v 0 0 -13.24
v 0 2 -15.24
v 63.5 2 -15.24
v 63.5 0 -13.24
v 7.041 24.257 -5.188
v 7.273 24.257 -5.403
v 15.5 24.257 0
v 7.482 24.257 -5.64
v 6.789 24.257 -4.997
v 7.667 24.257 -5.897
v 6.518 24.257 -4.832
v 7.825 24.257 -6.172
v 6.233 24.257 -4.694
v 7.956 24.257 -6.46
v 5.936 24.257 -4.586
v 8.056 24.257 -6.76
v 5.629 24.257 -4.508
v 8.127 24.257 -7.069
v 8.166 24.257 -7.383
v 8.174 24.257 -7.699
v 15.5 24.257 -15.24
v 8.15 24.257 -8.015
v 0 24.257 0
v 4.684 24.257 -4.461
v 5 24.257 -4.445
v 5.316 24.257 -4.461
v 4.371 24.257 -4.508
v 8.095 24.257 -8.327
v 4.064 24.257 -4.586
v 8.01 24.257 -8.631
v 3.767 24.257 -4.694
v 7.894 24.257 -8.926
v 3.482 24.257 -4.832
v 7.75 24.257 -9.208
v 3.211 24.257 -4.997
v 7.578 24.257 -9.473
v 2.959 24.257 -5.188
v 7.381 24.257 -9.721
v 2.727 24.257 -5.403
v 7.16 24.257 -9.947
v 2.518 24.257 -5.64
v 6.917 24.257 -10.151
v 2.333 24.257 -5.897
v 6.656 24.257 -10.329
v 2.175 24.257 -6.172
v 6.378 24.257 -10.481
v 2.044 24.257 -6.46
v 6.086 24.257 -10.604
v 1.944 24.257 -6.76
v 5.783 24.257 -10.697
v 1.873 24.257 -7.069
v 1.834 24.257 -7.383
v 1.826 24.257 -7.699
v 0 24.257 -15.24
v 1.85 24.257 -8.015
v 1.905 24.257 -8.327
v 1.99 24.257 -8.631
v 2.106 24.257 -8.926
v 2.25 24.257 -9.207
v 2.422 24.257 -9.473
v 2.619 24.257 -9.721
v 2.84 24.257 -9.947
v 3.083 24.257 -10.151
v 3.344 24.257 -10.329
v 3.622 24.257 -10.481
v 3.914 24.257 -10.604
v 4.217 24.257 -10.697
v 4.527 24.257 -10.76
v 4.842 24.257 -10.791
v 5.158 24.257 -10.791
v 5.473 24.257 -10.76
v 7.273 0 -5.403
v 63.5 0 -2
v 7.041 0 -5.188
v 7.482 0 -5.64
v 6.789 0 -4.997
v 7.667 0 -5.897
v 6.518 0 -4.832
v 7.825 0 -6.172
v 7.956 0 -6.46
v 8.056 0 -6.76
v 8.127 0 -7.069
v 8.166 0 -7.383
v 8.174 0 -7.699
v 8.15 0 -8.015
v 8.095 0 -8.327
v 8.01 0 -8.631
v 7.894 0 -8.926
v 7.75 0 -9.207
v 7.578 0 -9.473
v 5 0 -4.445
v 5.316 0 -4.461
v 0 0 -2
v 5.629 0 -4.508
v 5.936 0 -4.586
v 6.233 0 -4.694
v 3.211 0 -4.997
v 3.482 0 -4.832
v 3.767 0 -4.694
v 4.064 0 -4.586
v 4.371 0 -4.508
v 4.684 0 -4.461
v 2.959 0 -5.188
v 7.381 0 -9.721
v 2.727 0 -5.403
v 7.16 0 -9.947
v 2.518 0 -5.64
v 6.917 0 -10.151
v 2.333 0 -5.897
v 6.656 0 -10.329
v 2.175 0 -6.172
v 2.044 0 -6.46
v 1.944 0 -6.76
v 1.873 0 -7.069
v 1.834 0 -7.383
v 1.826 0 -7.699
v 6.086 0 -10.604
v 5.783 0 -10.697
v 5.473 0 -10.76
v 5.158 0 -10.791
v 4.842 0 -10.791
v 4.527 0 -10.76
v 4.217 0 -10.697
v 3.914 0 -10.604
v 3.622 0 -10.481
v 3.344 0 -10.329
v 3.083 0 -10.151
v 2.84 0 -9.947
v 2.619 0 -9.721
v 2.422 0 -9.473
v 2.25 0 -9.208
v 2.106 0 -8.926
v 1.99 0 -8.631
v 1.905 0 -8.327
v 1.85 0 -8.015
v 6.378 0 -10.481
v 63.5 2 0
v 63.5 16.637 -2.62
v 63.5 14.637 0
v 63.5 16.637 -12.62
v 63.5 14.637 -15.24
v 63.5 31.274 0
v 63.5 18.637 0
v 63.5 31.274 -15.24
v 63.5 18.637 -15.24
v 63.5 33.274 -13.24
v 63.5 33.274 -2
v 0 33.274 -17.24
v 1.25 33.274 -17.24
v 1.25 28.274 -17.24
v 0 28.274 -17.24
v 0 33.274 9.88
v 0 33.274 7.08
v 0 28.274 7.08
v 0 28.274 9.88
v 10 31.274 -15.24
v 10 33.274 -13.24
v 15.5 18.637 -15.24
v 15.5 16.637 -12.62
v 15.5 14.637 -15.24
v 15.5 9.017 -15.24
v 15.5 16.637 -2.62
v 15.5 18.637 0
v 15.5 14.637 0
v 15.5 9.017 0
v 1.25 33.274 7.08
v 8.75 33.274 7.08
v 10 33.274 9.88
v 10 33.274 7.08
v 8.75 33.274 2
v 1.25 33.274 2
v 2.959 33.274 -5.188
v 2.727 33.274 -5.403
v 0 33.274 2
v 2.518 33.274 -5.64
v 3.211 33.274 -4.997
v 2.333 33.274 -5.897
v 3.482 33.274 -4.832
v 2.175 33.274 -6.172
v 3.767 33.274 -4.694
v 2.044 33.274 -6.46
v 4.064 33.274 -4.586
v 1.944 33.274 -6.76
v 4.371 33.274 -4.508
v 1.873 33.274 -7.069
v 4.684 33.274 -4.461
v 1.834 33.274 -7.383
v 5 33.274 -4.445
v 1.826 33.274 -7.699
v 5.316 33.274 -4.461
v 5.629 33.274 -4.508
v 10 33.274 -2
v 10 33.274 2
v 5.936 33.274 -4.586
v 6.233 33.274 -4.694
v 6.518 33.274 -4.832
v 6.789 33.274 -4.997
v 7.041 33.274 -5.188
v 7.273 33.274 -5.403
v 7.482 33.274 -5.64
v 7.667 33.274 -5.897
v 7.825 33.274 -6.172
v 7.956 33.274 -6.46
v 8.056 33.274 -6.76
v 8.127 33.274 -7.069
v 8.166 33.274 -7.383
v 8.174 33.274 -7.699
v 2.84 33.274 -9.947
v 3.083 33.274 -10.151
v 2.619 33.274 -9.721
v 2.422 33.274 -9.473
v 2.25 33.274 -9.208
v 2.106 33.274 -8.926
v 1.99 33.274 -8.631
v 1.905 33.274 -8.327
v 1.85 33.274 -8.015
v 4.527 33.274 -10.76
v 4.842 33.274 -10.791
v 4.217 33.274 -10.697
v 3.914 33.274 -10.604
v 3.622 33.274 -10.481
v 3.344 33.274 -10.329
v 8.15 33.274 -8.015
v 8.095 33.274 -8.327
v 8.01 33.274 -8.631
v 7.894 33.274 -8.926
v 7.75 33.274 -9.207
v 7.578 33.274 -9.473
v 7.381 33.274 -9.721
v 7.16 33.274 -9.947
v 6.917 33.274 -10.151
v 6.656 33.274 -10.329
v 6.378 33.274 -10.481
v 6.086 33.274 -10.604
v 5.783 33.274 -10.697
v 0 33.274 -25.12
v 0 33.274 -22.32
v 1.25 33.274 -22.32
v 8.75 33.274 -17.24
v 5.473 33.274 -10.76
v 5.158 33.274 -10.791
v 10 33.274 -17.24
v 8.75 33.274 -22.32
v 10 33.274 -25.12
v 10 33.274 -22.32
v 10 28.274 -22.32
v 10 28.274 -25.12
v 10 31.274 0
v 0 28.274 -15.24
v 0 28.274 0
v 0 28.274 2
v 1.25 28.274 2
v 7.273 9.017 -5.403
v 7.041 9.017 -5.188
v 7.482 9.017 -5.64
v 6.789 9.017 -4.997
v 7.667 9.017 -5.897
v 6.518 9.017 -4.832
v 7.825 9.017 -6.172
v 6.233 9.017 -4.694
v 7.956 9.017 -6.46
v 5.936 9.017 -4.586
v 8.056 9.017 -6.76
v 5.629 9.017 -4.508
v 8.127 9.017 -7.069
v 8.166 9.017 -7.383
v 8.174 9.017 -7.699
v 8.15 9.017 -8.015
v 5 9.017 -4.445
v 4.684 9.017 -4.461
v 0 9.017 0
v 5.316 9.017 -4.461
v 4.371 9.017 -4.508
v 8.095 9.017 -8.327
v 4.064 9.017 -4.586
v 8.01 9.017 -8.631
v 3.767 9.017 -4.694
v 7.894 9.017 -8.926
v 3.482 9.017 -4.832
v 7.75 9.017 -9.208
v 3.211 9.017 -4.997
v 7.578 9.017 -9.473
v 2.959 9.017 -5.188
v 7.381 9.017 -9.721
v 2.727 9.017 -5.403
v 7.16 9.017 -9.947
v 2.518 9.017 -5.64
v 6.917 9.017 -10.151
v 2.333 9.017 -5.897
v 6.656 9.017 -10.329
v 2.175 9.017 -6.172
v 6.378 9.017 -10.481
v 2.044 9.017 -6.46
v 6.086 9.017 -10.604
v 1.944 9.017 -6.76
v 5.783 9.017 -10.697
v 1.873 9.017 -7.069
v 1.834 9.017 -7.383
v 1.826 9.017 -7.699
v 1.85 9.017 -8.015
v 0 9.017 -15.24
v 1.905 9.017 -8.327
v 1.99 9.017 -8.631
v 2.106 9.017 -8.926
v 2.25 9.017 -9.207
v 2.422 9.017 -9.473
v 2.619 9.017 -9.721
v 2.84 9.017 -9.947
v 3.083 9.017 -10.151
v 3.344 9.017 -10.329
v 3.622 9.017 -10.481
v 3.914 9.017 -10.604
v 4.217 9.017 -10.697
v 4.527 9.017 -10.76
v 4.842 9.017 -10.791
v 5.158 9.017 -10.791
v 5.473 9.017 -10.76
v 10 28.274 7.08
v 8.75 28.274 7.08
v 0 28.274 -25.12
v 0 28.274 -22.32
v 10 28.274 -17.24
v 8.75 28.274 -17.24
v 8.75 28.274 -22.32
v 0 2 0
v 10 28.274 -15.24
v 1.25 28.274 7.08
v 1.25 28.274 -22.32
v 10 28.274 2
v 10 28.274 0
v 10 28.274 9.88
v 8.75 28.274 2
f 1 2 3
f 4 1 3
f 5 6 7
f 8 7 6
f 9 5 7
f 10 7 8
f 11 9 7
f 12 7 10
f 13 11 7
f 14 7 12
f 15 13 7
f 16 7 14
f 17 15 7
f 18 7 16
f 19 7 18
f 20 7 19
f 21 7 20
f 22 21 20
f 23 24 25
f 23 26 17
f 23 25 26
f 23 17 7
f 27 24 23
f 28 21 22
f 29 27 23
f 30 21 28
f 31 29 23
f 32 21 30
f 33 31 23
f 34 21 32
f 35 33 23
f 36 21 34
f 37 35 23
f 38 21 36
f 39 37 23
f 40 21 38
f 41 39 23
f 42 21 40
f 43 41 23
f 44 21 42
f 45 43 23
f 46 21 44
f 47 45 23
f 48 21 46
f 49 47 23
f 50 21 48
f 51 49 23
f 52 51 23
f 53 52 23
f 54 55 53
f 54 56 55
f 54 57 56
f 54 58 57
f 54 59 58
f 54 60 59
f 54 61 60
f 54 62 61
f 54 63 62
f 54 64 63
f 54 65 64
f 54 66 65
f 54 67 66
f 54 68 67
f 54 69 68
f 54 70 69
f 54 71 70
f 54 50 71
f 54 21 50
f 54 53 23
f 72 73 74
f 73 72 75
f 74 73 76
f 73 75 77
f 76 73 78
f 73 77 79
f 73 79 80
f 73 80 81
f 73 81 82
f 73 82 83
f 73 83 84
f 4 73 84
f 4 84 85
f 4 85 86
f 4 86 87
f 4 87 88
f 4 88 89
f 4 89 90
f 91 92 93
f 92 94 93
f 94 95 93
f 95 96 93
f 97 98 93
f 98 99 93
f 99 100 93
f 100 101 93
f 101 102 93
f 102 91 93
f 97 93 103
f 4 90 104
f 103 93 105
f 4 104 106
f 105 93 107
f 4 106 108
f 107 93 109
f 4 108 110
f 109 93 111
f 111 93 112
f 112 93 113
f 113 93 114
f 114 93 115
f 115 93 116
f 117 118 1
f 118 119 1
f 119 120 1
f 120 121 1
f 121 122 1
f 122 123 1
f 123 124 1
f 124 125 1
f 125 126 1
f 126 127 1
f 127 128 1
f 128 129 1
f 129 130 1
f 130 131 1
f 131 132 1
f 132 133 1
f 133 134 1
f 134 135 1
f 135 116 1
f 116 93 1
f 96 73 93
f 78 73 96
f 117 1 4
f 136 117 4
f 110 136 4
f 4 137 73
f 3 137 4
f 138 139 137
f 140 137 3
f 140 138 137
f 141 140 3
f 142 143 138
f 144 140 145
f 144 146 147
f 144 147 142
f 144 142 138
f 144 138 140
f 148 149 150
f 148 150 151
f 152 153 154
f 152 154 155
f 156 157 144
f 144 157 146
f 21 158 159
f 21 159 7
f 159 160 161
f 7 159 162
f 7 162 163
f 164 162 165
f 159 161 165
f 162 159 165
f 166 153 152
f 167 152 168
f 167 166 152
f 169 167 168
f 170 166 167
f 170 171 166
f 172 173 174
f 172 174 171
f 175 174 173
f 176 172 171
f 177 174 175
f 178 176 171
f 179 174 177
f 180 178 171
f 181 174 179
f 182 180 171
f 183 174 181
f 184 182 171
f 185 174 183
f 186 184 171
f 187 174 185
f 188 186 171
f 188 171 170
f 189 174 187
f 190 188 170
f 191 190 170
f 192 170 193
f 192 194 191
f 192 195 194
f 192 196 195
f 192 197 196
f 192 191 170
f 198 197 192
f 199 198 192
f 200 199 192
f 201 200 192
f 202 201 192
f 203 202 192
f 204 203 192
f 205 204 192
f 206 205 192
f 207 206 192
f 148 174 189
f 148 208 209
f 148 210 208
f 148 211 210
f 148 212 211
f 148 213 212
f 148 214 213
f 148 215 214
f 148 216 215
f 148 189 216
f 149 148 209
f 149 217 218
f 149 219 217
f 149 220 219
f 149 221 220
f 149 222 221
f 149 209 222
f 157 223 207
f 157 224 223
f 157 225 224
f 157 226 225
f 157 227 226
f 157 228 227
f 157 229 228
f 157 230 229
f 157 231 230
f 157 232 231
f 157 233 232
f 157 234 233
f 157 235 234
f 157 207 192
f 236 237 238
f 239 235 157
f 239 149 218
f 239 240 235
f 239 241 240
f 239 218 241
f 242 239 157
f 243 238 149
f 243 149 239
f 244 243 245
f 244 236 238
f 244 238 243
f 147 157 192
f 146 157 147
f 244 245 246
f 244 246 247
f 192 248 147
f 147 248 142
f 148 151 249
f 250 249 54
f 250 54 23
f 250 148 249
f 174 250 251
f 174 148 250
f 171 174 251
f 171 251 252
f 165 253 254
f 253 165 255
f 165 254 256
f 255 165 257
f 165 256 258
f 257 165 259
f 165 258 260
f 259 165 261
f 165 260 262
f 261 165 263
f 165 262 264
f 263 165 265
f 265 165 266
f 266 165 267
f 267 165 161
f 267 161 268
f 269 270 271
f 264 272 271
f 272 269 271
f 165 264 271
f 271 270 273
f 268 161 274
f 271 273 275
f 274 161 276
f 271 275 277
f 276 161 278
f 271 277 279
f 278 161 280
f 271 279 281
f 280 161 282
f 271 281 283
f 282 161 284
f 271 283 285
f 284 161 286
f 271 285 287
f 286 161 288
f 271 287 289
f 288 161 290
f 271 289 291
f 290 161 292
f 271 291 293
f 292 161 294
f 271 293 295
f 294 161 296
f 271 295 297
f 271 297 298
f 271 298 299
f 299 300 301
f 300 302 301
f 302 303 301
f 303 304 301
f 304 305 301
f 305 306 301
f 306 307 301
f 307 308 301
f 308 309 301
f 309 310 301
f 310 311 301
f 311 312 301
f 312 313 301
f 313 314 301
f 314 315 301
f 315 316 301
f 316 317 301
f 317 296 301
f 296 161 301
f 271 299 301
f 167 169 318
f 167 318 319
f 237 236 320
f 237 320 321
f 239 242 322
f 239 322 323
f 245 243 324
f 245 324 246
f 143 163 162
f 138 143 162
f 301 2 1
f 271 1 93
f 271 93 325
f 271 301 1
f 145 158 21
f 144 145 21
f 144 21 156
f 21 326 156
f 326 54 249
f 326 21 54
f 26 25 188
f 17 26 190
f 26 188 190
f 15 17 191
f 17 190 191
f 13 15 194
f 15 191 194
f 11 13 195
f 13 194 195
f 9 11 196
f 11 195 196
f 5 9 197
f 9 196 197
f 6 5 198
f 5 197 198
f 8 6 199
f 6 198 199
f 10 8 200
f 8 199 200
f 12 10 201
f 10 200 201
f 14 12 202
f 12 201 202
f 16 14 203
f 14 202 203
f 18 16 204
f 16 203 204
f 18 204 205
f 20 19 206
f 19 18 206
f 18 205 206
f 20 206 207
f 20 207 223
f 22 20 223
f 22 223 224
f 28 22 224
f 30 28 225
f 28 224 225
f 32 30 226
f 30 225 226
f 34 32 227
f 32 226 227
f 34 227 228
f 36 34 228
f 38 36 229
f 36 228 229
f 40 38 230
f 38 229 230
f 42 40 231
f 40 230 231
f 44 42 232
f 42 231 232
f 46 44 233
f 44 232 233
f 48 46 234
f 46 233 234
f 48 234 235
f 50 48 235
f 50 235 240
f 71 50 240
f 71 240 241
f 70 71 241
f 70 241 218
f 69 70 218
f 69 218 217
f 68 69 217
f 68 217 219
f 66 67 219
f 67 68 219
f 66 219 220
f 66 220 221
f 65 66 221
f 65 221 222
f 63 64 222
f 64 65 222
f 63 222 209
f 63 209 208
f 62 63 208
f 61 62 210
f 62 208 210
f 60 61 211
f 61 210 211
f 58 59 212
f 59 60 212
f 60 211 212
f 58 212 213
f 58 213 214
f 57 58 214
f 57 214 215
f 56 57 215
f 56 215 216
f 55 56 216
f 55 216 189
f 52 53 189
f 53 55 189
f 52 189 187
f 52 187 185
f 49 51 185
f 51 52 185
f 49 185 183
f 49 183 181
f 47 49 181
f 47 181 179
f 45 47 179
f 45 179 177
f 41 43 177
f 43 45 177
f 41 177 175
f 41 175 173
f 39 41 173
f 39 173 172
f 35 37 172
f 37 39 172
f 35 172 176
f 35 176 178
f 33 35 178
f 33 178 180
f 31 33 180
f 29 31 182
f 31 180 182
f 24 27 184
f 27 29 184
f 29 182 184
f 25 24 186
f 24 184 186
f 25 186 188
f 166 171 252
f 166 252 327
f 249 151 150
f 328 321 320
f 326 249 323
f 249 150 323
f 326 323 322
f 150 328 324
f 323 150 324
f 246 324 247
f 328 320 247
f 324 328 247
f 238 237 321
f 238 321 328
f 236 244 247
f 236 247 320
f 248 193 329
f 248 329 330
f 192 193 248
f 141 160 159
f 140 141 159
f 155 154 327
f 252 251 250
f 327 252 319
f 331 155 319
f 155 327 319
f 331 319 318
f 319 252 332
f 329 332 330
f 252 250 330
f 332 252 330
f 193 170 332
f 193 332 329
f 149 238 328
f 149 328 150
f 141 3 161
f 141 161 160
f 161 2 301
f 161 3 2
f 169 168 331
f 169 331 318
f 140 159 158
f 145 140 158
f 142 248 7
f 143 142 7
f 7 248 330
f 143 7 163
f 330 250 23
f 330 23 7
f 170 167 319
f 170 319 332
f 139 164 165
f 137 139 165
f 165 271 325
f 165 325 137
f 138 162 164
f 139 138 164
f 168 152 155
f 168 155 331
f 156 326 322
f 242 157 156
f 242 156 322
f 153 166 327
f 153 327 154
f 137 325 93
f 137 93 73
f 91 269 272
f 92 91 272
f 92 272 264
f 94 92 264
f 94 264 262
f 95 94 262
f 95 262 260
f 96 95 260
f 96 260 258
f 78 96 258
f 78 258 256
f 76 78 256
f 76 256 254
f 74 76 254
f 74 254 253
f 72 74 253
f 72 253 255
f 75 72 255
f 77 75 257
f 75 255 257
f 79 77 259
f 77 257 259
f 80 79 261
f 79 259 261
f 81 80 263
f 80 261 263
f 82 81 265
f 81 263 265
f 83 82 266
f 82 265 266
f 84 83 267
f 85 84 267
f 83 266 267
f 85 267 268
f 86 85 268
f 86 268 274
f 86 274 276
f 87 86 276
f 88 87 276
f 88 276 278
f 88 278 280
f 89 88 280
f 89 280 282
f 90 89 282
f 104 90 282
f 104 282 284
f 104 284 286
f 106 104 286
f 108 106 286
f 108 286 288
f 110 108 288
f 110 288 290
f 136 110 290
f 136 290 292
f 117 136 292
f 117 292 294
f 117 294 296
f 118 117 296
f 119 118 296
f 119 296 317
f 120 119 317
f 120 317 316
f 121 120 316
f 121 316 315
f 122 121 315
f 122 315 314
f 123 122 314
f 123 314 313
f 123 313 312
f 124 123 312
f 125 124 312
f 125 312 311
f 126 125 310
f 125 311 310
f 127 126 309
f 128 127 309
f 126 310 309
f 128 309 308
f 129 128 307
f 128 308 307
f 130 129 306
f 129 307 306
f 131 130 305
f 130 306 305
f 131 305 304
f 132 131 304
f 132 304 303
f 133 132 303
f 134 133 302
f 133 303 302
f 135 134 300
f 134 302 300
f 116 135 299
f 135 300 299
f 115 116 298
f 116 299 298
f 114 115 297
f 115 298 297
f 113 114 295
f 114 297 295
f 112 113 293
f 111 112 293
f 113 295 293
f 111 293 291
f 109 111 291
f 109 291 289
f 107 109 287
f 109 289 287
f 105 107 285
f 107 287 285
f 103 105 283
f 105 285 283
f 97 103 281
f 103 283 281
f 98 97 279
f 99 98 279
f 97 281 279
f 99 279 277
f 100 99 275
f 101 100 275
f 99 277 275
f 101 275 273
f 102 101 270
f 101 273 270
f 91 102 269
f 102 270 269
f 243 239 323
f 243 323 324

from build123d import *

# Parameters (mm, degrees)
BOSS_EXTRUDE1_DEPTH = 63.5
CHAMFER1_SIZE       = 2
BOSS_EXTRUDE2_DEPTH = 5
SKETCH5_R           = 3.175
CUT_EXTRUDE3_DEPTH  = 76.963303483
SKETCH6_R           = 3.175
CUT_EXTRUDE4_DEPTH  = 7.62


with BuildPart() as part:
    # Sketch1 → Boss-Extrude1 (new body)
    with BuildSketch(Plane(origin=(0, 0, 0), x_dir=(0, 0, -1), z_dir=(1, 0, 0))):
        Polygon((0, 0), (15.24, 0), (15.24, 14.637), (12.62, 16.637), (15.24, 18.637), (15.24, 33.274), (0, 33.274), (0, 18.637), (2.62, 16.637), (0, 14.637), align=None)
    extrude(amount=BOSS_EXTRUDE1_DEPTH)

    # Chamfer1
    chamfer1_edges = [part.edges().sort_by_distance(p)[0] for p in [
        (31.75, 33.274, 0),
        (31.75, 33.274, -15.24),
        (31.75, 0, -15.24),
        (31.75, 0, 0),
    ]]
    chamfer(chamfer1_edges, length=CHAMFER1_SIZE)

    # Sketch4 → Boss-Extrude2 (add)
    with BuildSketch(Plane(origin=(0, 33.274, 0), x_dir=(1, 0, 0), z_dir=(0, 1, 0))):
        Polygon((10, 25.12), (0, 25.12), (0, 22.32), (1.25, 22.32), (1.25, 17.24), (0, 17.24), (0, -2), (1.25, -2), (1.25, -7.08), (0, -7.08), (0, -9.88), (10, -9.88), (10, -7.08), (8.75, -7.08), (8.75, -2), (10, -2), (10, 17.24), (8.75, 17.24), (8.75, 22.32), (10, 22.32), align=None)
    extrude(amount=-BOSS_EXTRUDE2_DEPTH)

    # Sketch5 → Cut-Extrude3 (cut, through all)
    with BuildSketch(Plane(origin=(0, 33.274, 0), x_dir=(1, 0, 0), z_dir=(0, 1, 0))):
        with Locations(Location((5, 7.62, 0), (0, 0, 270))):
            Circle(SKETCH5_R)
    extrude(amount=-CUT_EXTRUDE3_DEPTH, mode=Mode.SUBTRACT)

    # Sketch6 → Cut-Extrude4 (cut, symmetric)
    # profile 1 of 3: a face of its own
    with BuildSketch(Plane(origin=(0, 16.637, 0), x_dir=(-1, 0, 0), z_dir=(0, -1, 0))):
        with BuildLine():
            ThreePointArc((-15.5, 7.620000044), (-12.424621187, 15.044621218), (-5, 18.12))
            Line((-5, 18.12), (-15.5, 18.12))
            Line((-15.5, 18.12), (-15.5, 7.620000044))
        make_face()
    # profile 2 of 3: a face of its own
    with BuildSketch(Plane(origin=(0, 16.637, 0), x_dir=(-1, 0, 0), z_dir=(0, -1, 0))):
        with BuildLine():
            Line((5.5, 18.12), (-5, 18.12))
            ThreePointArc((-5, 18.12), (-12.424621187, 15.044621218), (-15.5, 7.620000044))
            ThreePointArc((-15.5, 7.620000044), (-12.424621218, 0.195378813), (-5, -2.88))
            Line((-5, -2.88), (5.5, -2.88))
            Line((5.5, -2.88), (5.5, 18.12))
        make_face()
        with Locations(Location((-5, 7.62, 0), (0, 0, 270))):
            Circle(SKETCH6_R, mode=Mode.SUBTRACT)
    # profile 3 of 3: a face of its own
    with BuildSketch(Plane(origin=(0, 16.637, 0), x_dir=(-1, 0, 0), z_dir=(0, -1, 0))):
        with BuildLine():
            ThreePointArc((-5, -2.88), (-12.424621218, 0.195378813), (-15.5, 7.620000044))
            Line((-15.5, 7.620000044), (-15.5, -2.88))
            Line((-15.5, -2.88), (-5, -2.88))
        make_face()
    extrude(amount=CUT_EXTRUDE4_DEPTH, both=True, mode=Mode.SUBTRACT)


solid = part.part
